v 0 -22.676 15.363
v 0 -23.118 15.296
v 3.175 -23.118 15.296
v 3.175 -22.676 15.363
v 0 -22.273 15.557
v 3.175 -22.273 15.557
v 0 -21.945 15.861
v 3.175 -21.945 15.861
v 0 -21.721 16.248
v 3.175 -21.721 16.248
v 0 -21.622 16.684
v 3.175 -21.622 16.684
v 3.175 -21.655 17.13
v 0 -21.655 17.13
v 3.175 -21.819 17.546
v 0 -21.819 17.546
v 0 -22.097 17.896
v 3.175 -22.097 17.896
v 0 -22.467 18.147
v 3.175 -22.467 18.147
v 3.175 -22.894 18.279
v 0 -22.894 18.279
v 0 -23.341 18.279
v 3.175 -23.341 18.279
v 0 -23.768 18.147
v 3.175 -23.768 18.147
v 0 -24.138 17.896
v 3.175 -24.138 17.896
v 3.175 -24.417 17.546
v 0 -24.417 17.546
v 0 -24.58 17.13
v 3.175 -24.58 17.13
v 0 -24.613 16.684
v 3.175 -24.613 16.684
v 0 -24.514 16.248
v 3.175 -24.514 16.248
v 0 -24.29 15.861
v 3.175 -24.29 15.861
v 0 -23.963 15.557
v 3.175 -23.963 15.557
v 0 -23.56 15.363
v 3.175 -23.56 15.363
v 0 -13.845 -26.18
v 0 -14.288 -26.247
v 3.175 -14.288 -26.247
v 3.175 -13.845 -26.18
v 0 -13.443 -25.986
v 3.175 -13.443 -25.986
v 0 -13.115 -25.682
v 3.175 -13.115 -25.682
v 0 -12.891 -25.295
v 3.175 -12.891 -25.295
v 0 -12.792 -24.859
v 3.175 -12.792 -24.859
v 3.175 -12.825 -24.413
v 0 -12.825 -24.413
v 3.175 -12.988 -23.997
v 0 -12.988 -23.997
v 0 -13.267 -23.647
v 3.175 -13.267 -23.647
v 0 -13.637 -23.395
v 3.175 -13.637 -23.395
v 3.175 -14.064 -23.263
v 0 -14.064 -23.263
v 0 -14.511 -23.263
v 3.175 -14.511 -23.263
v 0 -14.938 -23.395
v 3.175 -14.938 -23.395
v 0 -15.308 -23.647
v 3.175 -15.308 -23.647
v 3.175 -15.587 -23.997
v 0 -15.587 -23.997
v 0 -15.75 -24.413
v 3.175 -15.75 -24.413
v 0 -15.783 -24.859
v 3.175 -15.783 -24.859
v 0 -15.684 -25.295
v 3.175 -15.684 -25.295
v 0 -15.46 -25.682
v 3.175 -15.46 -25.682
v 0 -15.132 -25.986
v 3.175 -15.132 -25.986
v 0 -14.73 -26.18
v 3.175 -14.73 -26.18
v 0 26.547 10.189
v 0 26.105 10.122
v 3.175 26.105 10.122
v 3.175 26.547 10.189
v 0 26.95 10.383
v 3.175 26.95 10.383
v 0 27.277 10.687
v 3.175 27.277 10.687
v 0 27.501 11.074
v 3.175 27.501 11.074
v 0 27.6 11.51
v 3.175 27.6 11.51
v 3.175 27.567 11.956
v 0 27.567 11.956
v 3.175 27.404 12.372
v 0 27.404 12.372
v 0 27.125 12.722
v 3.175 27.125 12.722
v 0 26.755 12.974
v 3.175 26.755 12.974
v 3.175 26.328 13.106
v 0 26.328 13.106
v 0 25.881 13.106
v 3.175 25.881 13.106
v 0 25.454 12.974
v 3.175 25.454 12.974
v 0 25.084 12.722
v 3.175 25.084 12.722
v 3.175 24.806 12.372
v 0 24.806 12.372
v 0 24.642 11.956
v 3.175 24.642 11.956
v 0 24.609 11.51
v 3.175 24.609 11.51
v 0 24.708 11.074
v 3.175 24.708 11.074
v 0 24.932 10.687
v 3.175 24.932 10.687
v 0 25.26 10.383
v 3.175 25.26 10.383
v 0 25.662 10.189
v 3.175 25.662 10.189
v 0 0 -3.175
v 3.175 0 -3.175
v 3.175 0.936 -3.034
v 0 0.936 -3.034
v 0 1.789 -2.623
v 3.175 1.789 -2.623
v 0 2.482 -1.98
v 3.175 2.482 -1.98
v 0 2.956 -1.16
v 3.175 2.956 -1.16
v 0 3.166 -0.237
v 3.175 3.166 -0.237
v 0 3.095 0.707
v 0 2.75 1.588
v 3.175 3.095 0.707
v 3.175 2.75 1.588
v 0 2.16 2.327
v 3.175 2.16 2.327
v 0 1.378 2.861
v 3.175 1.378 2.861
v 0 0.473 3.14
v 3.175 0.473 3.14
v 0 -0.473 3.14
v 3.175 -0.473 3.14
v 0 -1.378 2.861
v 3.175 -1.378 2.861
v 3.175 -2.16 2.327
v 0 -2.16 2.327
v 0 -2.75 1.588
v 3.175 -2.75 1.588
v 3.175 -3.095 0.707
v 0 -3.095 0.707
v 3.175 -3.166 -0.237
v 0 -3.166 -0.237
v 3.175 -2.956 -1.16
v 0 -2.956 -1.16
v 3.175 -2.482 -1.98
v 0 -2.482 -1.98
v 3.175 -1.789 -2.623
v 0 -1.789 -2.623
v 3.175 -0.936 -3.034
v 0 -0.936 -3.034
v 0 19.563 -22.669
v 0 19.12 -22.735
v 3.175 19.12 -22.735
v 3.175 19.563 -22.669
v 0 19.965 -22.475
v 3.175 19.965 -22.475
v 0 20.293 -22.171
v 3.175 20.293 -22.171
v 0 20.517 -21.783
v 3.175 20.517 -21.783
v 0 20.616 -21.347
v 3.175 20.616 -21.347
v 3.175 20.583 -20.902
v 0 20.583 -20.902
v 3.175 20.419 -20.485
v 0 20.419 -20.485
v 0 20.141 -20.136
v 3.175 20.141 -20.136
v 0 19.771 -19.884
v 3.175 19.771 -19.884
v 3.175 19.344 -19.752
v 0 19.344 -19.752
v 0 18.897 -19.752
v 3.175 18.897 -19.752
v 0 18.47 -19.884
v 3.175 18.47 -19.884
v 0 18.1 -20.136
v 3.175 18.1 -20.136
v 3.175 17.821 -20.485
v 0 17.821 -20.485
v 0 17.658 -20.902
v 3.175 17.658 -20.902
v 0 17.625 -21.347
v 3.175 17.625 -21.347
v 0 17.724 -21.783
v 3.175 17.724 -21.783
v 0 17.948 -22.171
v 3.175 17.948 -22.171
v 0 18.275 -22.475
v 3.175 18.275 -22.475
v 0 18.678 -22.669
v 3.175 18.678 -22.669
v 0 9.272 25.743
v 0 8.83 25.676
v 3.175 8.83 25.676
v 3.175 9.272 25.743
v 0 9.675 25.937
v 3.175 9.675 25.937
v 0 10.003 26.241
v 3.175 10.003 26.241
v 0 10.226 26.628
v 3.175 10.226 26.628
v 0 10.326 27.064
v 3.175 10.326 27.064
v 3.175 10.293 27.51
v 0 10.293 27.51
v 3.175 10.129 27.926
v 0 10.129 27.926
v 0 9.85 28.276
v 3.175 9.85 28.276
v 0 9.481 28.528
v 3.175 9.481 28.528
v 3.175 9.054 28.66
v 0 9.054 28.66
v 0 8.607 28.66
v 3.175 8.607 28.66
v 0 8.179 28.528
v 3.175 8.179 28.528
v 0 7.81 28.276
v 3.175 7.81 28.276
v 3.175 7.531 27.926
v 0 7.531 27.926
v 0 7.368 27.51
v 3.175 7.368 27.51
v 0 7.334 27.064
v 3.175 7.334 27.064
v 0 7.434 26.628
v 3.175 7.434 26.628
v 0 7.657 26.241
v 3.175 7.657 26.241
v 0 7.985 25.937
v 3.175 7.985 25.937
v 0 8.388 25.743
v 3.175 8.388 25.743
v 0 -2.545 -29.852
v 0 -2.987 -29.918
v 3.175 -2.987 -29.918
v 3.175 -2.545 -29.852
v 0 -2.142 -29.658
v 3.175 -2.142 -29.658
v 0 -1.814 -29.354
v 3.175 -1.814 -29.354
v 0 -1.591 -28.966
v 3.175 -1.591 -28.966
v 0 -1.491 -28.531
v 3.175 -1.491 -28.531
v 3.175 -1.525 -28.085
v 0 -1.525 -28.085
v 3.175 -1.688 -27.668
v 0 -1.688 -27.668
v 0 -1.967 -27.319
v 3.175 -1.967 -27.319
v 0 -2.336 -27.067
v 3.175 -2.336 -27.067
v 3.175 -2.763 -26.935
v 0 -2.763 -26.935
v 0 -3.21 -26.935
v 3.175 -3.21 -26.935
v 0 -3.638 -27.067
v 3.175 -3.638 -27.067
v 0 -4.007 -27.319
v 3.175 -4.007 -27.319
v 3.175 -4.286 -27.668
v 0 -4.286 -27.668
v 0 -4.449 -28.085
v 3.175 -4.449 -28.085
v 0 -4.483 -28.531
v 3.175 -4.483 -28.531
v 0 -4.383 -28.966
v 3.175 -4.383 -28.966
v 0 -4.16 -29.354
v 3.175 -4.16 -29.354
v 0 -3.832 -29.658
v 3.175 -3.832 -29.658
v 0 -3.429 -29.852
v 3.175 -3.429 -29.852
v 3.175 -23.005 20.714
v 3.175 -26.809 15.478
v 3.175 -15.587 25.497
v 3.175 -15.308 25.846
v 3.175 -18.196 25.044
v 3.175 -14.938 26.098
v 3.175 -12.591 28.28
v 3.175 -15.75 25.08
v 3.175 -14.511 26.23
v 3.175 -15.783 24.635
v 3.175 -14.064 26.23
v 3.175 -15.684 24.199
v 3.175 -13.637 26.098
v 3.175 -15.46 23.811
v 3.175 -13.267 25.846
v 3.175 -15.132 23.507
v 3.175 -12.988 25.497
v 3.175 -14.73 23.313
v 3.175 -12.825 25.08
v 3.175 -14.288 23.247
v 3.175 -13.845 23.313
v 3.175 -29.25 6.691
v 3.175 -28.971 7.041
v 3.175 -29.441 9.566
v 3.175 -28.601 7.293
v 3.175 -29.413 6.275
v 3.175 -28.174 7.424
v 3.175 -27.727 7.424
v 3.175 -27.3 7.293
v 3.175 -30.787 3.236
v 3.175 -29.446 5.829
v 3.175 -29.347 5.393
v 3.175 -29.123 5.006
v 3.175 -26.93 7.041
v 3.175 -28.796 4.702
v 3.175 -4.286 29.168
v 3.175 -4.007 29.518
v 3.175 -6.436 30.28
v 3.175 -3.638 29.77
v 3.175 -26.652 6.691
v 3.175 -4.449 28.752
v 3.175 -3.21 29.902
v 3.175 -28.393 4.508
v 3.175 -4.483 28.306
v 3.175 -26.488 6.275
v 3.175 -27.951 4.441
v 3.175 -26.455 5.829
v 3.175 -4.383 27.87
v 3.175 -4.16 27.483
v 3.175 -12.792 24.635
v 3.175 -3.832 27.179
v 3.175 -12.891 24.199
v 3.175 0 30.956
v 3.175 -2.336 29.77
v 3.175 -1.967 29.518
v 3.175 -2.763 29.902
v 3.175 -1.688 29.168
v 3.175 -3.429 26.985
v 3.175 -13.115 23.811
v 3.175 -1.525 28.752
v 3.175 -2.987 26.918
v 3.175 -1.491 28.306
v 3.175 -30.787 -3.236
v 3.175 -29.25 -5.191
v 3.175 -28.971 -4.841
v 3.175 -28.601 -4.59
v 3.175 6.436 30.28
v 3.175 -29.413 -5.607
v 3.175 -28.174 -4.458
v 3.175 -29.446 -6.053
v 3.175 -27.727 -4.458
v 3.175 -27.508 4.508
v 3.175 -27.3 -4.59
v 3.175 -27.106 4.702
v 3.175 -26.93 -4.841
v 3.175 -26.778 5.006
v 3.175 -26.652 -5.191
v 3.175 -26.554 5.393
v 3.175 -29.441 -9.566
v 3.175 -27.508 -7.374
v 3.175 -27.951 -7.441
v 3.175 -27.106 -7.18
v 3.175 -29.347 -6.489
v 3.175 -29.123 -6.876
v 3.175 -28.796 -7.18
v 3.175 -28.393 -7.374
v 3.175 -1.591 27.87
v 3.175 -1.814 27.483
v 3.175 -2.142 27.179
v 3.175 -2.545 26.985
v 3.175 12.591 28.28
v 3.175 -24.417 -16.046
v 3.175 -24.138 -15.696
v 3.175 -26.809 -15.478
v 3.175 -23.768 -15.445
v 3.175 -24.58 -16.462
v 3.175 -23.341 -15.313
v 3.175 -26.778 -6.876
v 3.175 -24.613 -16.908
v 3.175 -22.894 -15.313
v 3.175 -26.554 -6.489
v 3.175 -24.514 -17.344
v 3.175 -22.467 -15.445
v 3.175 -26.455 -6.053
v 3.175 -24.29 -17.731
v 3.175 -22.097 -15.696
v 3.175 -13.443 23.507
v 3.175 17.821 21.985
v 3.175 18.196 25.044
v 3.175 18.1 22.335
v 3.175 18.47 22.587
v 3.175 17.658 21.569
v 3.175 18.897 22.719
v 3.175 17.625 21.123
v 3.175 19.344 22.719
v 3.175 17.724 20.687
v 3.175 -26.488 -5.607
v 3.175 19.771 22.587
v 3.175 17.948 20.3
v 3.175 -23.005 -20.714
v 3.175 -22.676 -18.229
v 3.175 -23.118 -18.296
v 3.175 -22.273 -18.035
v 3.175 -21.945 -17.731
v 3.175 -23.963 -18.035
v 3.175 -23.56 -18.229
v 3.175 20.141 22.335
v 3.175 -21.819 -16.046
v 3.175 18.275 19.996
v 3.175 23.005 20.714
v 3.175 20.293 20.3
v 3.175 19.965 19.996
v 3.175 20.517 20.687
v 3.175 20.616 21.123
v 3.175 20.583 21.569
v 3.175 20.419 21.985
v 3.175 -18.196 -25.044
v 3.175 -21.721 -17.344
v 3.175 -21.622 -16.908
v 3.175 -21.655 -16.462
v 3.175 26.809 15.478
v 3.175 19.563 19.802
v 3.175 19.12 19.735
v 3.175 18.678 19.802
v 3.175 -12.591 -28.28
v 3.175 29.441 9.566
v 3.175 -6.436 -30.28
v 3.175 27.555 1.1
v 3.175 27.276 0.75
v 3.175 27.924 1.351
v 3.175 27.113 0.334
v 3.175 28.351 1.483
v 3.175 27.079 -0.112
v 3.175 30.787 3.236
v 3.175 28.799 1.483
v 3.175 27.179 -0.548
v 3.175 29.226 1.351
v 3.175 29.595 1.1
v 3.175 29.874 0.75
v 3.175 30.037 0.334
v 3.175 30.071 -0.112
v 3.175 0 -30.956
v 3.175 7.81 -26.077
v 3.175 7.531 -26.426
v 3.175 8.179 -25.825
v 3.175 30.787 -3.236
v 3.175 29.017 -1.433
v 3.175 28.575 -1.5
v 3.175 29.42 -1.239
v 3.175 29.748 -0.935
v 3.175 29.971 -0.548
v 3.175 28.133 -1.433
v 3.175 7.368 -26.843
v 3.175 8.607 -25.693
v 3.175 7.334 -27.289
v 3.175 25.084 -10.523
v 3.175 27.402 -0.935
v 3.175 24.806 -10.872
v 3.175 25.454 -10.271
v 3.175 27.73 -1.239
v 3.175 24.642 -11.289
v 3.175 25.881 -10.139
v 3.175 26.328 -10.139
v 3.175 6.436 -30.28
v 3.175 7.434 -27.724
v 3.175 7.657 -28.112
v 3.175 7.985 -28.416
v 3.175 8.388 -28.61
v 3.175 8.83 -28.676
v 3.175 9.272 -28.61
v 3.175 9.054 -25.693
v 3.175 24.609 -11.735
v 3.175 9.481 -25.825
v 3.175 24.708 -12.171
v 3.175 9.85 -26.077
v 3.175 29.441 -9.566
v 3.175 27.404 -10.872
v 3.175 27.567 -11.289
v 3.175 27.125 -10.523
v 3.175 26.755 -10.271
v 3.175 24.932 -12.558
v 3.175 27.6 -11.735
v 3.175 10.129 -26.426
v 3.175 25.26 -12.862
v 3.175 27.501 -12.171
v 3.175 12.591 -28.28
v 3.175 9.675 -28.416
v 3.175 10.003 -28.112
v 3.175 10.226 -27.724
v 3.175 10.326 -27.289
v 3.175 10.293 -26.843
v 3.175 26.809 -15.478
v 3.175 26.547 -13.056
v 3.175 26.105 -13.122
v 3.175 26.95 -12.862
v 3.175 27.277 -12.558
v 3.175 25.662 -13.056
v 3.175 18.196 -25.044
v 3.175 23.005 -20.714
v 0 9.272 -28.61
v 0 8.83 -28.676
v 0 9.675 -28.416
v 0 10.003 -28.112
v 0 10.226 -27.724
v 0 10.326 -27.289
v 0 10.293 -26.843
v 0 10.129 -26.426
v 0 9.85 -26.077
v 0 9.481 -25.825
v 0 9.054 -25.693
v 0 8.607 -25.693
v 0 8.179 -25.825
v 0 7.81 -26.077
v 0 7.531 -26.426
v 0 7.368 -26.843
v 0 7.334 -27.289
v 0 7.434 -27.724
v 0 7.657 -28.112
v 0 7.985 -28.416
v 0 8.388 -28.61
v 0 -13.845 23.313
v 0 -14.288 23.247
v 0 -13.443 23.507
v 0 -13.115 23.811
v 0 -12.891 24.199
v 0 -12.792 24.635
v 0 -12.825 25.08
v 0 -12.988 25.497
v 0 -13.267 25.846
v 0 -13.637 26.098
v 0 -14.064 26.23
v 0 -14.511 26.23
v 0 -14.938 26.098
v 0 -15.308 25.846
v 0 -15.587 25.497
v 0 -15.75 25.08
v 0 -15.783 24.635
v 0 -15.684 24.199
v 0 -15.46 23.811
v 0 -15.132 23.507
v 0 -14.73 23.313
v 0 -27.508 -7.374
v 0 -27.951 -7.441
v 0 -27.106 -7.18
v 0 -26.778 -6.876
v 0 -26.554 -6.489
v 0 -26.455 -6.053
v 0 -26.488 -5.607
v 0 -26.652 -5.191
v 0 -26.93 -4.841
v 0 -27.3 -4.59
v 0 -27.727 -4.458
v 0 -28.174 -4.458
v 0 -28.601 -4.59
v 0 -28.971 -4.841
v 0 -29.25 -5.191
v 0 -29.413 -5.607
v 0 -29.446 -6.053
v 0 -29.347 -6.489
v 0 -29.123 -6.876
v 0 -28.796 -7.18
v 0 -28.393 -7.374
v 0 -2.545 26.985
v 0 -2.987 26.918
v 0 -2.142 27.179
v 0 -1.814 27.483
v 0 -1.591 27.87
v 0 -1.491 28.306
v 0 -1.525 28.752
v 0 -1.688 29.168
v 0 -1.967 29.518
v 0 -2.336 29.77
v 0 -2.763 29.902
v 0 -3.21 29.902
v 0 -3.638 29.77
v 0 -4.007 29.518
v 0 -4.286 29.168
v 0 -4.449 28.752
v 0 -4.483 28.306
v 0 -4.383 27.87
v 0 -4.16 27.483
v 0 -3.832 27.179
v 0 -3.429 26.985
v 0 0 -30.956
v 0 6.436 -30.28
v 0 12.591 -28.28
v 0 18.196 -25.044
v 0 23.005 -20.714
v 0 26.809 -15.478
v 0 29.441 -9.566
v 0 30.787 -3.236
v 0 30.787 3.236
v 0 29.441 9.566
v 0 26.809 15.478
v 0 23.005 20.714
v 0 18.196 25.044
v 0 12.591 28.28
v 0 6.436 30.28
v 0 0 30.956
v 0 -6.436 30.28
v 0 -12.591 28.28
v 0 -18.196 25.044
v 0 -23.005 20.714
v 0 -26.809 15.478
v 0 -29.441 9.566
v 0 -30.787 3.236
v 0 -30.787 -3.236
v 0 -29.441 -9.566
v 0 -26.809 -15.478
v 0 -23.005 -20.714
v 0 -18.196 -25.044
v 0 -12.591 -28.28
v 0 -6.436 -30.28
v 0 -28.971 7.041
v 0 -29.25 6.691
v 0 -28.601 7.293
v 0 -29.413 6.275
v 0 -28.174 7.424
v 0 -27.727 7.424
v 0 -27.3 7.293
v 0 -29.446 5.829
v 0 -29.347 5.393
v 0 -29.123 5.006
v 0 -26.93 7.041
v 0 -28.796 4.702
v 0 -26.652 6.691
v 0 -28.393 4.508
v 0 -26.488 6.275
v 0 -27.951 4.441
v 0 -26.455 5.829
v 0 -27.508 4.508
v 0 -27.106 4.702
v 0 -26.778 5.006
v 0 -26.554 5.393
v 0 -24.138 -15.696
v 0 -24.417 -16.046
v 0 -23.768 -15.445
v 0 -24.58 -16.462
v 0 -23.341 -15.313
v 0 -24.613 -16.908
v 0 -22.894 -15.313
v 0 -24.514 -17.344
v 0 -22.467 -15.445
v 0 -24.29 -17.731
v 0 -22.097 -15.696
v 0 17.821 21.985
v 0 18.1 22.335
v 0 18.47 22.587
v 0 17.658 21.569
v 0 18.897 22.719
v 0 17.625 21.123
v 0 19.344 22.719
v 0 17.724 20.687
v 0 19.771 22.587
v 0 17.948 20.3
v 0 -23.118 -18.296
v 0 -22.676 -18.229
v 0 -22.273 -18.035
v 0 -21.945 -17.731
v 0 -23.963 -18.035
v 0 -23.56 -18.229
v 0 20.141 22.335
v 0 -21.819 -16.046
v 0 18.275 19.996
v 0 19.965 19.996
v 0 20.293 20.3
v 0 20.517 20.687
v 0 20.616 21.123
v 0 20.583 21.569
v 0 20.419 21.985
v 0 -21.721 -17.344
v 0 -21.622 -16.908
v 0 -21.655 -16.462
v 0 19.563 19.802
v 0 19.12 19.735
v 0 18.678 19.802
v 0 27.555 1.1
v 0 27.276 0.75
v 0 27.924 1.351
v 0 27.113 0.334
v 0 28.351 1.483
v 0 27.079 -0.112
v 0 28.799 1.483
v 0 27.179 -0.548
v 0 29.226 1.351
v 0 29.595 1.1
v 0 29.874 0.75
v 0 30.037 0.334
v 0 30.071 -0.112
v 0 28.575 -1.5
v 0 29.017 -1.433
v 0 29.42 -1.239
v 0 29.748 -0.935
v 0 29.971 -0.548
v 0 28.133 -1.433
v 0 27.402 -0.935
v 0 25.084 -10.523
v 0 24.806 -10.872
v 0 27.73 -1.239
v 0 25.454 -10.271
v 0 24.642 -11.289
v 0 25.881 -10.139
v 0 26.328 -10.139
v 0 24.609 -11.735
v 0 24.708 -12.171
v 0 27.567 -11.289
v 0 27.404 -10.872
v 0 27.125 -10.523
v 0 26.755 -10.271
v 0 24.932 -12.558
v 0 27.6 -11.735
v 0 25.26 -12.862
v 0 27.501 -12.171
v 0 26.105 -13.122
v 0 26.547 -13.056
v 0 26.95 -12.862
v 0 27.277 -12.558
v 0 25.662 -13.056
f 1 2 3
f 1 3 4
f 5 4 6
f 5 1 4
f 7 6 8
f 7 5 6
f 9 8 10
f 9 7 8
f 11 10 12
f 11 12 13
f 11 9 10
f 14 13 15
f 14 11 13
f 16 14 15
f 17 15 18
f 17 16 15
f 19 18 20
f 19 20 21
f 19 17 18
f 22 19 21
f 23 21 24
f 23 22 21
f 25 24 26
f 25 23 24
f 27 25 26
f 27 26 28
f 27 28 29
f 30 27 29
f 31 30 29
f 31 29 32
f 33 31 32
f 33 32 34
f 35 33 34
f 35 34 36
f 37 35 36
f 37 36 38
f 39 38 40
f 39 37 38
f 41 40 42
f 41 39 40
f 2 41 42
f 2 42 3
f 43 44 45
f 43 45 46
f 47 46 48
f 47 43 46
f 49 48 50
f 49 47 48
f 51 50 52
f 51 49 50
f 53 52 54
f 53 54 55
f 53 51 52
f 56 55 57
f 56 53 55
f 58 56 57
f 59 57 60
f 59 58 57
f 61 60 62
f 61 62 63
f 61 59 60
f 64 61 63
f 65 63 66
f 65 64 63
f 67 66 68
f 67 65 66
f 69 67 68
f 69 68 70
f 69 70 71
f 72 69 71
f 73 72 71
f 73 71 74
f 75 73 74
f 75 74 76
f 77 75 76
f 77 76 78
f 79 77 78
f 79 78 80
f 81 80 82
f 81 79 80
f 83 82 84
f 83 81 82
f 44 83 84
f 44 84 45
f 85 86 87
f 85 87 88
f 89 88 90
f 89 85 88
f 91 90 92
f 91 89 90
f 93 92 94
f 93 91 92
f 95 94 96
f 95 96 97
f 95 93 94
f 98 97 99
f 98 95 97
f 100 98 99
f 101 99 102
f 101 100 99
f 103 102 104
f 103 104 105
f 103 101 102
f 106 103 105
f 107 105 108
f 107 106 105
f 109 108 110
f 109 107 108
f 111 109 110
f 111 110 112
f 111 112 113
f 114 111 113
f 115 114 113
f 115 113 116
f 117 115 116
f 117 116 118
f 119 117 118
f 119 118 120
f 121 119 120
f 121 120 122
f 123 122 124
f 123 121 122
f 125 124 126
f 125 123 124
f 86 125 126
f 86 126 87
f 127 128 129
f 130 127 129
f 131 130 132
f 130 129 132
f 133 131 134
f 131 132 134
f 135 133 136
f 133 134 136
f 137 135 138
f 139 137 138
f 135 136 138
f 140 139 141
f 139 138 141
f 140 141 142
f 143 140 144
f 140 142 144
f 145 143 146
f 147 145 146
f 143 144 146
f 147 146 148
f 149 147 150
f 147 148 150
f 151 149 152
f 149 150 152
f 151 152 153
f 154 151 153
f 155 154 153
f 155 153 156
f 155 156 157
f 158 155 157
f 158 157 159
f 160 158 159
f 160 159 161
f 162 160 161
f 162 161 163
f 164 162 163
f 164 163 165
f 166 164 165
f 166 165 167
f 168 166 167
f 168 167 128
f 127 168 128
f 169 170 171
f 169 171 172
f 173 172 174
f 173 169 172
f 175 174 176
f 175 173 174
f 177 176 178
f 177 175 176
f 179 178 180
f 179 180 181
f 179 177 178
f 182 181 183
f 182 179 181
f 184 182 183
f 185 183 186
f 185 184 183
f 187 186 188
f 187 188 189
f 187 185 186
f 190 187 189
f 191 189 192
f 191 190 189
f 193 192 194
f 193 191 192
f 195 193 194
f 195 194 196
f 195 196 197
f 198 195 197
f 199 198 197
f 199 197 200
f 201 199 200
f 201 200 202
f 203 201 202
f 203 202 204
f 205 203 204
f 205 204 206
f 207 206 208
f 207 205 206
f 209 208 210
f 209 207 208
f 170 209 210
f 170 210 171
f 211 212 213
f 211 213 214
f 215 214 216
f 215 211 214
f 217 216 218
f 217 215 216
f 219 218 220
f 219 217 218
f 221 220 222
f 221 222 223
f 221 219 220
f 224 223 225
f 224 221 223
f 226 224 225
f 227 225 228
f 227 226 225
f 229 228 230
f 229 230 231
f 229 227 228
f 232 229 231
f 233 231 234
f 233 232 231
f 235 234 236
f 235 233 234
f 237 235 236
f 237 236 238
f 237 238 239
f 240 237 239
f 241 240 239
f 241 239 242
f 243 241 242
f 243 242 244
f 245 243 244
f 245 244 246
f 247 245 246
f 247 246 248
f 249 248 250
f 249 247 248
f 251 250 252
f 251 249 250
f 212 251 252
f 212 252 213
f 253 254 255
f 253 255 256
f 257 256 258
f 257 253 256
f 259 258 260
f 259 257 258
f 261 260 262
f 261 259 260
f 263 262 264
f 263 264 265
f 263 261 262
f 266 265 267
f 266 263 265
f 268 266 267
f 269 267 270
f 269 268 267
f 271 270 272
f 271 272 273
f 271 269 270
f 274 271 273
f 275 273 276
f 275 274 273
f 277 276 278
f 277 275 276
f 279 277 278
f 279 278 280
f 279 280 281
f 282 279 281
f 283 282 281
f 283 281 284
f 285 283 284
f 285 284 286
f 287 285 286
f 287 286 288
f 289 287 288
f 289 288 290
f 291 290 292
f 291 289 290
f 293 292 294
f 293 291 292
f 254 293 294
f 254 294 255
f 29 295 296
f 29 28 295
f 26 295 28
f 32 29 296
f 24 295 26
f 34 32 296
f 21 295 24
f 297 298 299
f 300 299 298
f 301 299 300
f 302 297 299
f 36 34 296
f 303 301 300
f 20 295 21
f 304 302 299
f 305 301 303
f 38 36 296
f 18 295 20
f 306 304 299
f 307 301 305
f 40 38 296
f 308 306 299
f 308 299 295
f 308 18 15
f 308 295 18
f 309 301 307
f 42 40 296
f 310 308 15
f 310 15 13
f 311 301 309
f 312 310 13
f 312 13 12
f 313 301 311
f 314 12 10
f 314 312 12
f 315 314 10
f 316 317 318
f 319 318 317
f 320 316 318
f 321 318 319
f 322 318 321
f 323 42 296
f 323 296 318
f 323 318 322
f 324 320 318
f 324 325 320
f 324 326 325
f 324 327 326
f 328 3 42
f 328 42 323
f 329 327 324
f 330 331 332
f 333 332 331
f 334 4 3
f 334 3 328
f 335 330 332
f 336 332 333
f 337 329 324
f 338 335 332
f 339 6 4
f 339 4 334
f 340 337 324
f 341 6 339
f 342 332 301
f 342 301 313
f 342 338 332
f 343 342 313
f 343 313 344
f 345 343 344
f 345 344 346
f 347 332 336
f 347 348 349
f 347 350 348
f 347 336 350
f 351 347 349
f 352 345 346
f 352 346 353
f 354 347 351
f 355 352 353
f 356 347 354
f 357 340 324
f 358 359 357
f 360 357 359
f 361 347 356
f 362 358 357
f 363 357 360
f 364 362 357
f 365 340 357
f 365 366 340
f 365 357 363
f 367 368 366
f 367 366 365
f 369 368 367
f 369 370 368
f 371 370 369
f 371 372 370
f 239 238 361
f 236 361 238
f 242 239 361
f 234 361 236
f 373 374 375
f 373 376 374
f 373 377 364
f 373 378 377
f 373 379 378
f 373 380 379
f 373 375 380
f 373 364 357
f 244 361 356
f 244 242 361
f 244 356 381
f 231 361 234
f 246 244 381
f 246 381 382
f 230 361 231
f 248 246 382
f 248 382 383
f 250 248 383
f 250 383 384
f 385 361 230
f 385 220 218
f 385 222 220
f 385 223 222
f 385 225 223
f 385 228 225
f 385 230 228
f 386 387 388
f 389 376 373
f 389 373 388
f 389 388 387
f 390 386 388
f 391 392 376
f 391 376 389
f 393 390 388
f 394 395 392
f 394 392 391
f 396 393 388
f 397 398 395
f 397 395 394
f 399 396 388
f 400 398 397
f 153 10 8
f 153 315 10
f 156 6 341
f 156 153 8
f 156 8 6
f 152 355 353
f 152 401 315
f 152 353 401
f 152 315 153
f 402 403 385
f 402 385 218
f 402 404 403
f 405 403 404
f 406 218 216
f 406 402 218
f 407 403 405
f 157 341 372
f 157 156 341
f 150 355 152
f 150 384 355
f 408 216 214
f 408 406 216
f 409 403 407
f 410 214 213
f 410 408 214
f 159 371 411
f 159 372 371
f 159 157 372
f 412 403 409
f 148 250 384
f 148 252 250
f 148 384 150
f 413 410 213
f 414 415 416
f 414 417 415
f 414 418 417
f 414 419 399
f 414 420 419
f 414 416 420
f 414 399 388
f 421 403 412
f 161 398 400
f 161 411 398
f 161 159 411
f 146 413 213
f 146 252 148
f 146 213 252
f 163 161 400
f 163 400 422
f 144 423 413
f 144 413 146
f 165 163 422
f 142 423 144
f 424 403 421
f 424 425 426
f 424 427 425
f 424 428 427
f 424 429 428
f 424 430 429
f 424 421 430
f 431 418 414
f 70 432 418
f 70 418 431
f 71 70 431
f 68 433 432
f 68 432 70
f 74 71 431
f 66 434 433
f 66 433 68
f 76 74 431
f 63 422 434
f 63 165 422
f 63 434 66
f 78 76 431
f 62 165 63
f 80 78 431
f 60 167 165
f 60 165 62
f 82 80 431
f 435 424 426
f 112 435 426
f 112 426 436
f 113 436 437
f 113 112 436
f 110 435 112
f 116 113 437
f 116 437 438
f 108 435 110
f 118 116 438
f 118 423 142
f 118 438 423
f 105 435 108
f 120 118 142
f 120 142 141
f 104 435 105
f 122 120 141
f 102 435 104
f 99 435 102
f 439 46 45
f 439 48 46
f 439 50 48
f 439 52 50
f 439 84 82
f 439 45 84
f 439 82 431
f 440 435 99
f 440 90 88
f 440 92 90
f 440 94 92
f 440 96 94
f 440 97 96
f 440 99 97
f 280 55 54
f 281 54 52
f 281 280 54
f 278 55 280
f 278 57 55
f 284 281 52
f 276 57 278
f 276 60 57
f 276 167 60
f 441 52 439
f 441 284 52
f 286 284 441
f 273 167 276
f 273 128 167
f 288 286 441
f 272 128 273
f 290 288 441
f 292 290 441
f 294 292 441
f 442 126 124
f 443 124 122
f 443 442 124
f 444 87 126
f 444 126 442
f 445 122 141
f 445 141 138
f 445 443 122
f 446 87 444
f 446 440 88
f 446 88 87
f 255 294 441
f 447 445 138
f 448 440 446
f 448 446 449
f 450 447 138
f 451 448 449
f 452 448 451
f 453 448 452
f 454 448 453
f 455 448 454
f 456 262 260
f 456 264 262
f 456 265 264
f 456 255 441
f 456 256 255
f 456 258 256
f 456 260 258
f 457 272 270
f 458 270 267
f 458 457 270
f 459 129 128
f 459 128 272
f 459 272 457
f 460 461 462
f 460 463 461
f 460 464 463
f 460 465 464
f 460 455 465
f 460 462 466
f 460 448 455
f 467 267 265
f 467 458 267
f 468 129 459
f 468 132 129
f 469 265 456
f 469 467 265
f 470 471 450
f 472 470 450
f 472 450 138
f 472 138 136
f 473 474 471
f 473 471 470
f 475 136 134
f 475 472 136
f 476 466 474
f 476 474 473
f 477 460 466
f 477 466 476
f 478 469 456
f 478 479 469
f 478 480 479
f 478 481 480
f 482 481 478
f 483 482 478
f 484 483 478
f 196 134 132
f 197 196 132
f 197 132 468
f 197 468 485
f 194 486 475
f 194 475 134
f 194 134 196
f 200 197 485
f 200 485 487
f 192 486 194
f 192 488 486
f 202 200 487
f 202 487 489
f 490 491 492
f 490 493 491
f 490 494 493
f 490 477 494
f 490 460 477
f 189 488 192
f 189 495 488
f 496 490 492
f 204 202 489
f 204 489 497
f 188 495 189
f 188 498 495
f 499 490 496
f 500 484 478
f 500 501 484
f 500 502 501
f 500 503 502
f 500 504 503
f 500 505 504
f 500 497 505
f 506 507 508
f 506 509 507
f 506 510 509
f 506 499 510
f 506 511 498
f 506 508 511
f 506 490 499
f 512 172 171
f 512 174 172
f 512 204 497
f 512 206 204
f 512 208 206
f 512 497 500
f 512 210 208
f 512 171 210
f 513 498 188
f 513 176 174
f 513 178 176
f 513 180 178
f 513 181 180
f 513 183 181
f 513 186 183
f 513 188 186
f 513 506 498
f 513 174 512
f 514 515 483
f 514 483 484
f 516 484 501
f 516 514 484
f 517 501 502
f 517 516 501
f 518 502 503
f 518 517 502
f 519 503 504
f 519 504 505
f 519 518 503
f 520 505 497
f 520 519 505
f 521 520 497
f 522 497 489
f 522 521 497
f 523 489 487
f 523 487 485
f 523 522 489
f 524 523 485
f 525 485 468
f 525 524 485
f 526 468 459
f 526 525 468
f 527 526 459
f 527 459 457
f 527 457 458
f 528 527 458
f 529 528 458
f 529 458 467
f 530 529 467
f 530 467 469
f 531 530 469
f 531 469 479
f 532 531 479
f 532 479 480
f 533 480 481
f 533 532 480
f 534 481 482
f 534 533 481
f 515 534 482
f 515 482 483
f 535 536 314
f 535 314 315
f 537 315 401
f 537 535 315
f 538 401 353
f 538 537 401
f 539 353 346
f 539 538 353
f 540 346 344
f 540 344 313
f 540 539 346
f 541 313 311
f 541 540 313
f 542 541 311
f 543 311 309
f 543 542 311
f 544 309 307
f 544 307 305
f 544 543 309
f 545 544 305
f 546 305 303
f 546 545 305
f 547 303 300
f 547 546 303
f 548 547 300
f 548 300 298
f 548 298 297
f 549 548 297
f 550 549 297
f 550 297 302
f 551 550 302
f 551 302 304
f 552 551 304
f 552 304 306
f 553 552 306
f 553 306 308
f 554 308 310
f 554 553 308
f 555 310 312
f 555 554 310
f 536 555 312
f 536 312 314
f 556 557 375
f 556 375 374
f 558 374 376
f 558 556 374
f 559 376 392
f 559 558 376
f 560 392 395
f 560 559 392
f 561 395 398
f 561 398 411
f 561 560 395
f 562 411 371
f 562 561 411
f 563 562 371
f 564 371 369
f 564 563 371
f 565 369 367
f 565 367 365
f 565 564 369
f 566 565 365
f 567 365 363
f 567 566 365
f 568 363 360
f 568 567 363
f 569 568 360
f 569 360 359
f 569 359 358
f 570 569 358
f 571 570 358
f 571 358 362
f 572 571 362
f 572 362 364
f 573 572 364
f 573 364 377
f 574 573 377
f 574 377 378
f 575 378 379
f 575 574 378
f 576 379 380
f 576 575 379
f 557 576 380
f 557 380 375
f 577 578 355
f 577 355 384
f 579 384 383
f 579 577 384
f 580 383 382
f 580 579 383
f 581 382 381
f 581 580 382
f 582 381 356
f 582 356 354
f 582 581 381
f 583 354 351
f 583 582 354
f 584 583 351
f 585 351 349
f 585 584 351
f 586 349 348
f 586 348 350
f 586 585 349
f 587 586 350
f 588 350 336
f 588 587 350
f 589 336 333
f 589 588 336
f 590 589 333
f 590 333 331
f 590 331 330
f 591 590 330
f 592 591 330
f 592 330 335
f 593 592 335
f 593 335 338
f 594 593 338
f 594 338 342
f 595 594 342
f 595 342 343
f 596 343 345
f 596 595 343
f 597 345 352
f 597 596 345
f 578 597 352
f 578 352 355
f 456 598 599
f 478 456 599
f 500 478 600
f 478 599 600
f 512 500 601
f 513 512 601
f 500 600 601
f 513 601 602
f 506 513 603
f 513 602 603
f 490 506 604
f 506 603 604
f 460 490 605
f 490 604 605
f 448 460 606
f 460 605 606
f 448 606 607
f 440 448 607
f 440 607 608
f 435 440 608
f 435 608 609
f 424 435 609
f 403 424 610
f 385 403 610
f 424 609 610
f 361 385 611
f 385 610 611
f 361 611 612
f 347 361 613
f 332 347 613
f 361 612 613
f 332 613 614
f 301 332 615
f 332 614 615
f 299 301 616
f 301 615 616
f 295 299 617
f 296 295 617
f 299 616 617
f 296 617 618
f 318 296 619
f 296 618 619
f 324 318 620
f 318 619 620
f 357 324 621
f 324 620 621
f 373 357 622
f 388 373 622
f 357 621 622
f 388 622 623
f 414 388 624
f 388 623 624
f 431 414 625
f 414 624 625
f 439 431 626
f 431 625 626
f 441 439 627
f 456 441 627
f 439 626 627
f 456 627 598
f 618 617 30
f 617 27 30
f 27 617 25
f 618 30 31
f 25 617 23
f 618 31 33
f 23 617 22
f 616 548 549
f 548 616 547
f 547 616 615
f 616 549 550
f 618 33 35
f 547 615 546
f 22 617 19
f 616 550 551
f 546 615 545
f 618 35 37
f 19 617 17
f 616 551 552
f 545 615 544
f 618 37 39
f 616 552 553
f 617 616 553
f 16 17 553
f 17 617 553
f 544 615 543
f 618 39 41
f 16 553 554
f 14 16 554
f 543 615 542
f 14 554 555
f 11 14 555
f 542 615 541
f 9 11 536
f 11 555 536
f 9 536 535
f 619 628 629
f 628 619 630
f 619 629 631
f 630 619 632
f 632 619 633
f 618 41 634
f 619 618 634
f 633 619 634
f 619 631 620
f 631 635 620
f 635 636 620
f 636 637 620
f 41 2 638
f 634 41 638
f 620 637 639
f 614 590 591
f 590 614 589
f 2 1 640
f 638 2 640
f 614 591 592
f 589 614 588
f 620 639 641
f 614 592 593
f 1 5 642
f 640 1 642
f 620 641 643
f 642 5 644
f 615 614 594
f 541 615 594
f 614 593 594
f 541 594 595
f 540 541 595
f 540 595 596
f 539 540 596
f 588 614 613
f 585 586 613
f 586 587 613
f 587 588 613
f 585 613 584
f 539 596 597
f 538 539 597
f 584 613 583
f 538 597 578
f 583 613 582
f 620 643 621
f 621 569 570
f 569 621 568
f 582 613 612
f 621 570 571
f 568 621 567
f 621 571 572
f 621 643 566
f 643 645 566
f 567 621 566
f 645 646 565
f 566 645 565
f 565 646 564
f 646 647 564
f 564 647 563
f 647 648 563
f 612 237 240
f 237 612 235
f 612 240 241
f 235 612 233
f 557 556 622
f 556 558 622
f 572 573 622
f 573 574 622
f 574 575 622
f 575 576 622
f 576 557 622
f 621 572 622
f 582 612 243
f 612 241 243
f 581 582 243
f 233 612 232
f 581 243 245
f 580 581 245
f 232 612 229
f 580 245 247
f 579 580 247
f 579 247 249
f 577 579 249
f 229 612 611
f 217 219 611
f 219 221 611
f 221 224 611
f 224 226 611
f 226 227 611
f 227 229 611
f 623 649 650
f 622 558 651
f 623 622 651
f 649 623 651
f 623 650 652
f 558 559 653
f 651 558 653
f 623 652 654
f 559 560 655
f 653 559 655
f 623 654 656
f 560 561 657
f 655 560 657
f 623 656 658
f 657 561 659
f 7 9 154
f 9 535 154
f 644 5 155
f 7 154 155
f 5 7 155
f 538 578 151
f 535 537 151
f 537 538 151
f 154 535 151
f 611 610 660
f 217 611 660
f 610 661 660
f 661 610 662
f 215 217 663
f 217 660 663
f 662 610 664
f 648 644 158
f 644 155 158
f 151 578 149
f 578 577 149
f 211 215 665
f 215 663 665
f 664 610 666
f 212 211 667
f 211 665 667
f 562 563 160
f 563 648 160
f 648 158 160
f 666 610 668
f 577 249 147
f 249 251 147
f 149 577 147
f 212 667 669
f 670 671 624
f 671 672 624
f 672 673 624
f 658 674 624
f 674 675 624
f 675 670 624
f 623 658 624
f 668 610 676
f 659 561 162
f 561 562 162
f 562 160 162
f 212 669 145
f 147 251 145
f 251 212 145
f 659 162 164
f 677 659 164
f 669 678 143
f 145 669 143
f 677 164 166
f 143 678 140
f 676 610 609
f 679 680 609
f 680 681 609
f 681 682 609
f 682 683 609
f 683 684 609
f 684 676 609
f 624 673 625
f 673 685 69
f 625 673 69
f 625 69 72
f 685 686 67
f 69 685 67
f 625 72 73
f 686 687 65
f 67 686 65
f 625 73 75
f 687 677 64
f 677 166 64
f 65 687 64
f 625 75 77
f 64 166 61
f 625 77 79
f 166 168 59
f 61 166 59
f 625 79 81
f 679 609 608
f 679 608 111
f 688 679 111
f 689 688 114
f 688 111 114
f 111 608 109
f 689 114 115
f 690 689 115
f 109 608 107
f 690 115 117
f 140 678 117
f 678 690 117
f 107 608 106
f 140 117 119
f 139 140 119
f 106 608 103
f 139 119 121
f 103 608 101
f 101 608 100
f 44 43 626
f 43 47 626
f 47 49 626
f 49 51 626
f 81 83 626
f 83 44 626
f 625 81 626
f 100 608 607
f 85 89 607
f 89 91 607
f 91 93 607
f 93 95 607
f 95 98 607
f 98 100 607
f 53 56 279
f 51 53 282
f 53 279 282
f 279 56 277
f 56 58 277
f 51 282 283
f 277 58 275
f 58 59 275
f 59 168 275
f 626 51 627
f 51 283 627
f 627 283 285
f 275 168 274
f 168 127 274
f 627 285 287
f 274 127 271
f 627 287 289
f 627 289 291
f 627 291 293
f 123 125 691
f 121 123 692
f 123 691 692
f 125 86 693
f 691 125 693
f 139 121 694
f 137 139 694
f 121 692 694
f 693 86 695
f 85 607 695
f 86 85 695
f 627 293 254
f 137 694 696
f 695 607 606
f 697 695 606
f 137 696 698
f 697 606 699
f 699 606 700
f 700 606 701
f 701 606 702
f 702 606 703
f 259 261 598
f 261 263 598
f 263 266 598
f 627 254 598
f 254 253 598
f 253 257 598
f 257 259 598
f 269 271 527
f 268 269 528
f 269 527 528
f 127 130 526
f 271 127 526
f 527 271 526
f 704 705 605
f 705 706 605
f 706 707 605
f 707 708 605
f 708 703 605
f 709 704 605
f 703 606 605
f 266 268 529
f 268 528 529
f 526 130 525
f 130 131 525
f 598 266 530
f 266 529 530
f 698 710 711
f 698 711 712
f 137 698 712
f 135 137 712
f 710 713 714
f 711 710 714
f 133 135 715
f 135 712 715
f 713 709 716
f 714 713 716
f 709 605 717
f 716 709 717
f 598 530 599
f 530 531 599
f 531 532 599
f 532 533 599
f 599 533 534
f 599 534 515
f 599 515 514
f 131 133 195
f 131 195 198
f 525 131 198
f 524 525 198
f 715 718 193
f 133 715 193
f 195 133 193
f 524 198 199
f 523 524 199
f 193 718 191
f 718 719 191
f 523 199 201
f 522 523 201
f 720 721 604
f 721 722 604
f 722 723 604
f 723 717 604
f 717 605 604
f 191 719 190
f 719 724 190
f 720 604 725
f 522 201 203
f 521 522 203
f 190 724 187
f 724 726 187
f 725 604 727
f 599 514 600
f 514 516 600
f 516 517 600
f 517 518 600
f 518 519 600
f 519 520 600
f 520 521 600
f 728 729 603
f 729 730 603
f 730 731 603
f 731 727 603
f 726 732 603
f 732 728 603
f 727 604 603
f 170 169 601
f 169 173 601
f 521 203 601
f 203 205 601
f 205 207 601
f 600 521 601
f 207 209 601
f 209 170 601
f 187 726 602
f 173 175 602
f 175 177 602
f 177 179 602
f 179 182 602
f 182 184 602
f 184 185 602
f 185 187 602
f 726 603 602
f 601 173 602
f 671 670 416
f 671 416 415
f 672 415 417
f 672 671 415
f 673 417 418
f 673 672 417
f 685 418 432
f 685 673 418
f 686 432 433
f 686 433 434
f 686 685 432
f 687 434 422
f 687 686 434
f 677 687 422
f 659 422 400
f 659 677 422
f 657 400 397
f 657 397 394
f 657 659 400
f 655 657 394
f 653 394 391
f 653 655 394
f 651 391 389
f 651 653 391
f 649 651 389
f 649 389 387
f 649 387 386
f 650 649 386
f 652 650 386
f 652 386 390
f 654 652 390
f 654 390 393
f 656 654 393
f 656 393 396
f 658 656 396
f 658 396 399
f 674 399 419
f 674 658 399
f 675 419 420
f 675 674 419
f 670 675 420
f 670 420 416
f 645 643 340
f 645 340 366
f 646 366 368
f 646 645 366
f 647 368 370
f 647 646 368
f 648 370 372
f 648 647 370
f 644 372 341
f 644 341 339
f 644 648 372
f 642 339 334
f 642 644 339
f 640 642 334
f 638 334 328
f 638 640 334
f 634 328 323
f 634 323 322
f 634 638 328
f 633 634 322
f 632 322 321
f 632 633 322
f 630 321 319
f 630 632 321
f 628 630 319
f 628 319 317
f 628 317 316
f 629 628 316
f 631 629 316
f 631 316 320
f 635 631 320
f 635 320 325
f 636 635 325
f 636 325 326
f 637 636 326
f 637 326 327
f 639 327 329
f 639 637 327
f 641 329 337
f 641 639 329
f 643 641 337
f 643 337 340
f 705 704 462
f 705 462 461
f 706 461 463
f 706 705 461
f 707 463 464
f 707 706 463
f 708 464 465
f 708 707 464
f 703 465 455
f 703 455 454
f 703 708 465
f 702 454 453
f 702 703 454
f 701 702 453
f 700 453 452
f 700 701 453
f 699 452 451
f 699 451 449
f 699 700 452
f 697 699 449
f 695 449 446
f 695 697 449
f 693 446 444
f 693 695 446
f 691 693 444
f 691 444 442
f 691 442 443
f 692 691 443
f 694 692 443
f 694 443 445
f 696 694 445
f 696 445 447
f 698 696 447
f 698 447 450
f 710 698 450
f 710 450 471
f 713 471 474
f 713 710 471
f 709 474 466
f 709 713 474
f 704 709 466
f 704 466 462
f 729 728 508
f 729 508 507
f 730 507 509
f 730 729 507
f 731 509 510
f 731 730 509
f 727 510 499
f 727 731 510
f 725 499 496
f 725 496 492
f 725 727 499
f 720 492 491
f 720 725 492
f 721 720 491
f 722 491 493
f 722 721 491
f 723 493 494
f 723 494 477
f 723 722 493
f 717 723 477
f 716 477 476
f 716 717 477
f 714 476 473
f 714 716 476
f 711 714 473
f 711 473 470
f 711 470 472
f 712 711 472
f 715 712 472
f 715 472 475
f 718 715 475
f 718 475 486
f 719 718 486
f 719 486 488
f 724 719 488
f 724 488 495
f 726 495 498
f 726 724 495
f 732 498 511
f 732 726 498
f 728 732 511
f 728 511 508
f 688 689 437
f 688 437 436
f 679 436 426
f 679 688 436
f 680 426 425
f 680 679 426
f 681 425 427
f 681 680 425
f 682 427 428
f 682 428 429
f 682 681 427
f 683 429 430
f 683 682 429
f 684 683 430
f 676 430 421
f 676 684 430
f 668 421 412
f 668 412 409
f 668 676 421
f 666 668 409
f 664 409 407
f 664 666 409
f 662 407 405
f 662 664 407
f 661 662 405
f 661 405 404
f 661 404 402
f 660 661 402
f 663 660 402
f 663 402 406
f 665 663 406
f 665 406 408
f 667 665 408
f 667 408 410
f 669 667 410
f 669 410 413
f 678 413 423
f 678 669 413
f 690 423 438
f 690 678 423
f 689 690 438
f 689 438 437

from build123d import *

# Parameters (mm, degrees)
SKETCH1_R           = 30.95625
SKETCH1_R_2         = 1.5
BOSS_EXTRUDE1_DEPTH = 3.175
SKETCH2_R           = 3.175
CUT_EXTRUDE1_DEPTH  = 44.893729087


with BuildPart() as part:
    # Sketch1 → Boss-Extrude1 (new body)
    with BuildSketch(Plane(origin=(0, 0, 0), x_dir=(0, 0, -1), z_dir=(1, 0, 0))):
        Circle(SKETCH1_R)
        with Locations((0, 28.575)):
            Circle(SKETCH1_R_2, mode=Mode.SUBTRACT)
        with Locations((11.622499576, 26.104561452)):
            Circle(SKETCH1_R_2, mode=Mode.SUBTRACT)
        with Locations((21.235363388, 19.120407077)):
            Circle(SKETCH1_R_2, mode=Mode.SUBTRACT)
        with Locations((27.176439953, 8.830160614)):
            Circle(SKETCH1_R_2, mode=Mode.SUBTRACT)
        with Locations((28.41846316, -2.986900838)):
            Circle(SKETCH1_R_2, mode=Mode.SUBTRACT)
        with Locations((24.746675913, -14.2875)):
            Circle(SKETCH1_R_2, mode=Mode.SUBTRACT)
        with Locations((16.795963584, -23.117660614)):
            Circle(SKETCH1_R_2, mode=Mode.SUBTRACT)
        with Locations((5.941076565, -27.950567691)):
            Circle(SKETCH1_R_2, mode=Mode.SUBTRACT)
        with Locations((-5.941076565, -27.950567691)):
            Circle(SKETCH1_R_2, mode=Mode.SUBTRACT)
        with Locations((-16.795963584, -23.117660614)):
            Circle(SKETCH1_R_2, mode=Mode.SUBTRACT)
        with Locations((-24.746675913, -14.2875)):
            Circle(SKETCH1_R_2, mode=Mode.SUBTRACT)
        with Locations((-28.41846316, -2.986900838)):
            Circle(SKETCH1_R_2, mode=Mode.SUBTRACT)
        with Locations((-27.176439953, 8.830160614)):
            Circle(SKETCH1_R_2, mode=Mode.SUBTRACT)
        with Locations((-21.235363388, 19.120407077)):
            Circle(SKETCH1_R_2, mode=Mode.SUBTRACT)
        with Locations((-11.622499576, 26.104561452)):
            Circle(SKETCH1_R_2, mode=Mode.SUBTRACT)
    extrude(amount=BOSS_EXTRUDE1_DEPTH)

    # Sketch2 → Cut-Extrude1 (cut, through all)
    with BuildSketch(Plane(origin=(3.175, 0, 0), x_dir=(0, 0, -1), z_dir=(1, 0, 0))):
        Circle(SKETCH2_R)
    extrude(amount=-CUT_EXTRUDE1_DEPTH, mode=Mode.SUBTRACT)


solid = part.part
